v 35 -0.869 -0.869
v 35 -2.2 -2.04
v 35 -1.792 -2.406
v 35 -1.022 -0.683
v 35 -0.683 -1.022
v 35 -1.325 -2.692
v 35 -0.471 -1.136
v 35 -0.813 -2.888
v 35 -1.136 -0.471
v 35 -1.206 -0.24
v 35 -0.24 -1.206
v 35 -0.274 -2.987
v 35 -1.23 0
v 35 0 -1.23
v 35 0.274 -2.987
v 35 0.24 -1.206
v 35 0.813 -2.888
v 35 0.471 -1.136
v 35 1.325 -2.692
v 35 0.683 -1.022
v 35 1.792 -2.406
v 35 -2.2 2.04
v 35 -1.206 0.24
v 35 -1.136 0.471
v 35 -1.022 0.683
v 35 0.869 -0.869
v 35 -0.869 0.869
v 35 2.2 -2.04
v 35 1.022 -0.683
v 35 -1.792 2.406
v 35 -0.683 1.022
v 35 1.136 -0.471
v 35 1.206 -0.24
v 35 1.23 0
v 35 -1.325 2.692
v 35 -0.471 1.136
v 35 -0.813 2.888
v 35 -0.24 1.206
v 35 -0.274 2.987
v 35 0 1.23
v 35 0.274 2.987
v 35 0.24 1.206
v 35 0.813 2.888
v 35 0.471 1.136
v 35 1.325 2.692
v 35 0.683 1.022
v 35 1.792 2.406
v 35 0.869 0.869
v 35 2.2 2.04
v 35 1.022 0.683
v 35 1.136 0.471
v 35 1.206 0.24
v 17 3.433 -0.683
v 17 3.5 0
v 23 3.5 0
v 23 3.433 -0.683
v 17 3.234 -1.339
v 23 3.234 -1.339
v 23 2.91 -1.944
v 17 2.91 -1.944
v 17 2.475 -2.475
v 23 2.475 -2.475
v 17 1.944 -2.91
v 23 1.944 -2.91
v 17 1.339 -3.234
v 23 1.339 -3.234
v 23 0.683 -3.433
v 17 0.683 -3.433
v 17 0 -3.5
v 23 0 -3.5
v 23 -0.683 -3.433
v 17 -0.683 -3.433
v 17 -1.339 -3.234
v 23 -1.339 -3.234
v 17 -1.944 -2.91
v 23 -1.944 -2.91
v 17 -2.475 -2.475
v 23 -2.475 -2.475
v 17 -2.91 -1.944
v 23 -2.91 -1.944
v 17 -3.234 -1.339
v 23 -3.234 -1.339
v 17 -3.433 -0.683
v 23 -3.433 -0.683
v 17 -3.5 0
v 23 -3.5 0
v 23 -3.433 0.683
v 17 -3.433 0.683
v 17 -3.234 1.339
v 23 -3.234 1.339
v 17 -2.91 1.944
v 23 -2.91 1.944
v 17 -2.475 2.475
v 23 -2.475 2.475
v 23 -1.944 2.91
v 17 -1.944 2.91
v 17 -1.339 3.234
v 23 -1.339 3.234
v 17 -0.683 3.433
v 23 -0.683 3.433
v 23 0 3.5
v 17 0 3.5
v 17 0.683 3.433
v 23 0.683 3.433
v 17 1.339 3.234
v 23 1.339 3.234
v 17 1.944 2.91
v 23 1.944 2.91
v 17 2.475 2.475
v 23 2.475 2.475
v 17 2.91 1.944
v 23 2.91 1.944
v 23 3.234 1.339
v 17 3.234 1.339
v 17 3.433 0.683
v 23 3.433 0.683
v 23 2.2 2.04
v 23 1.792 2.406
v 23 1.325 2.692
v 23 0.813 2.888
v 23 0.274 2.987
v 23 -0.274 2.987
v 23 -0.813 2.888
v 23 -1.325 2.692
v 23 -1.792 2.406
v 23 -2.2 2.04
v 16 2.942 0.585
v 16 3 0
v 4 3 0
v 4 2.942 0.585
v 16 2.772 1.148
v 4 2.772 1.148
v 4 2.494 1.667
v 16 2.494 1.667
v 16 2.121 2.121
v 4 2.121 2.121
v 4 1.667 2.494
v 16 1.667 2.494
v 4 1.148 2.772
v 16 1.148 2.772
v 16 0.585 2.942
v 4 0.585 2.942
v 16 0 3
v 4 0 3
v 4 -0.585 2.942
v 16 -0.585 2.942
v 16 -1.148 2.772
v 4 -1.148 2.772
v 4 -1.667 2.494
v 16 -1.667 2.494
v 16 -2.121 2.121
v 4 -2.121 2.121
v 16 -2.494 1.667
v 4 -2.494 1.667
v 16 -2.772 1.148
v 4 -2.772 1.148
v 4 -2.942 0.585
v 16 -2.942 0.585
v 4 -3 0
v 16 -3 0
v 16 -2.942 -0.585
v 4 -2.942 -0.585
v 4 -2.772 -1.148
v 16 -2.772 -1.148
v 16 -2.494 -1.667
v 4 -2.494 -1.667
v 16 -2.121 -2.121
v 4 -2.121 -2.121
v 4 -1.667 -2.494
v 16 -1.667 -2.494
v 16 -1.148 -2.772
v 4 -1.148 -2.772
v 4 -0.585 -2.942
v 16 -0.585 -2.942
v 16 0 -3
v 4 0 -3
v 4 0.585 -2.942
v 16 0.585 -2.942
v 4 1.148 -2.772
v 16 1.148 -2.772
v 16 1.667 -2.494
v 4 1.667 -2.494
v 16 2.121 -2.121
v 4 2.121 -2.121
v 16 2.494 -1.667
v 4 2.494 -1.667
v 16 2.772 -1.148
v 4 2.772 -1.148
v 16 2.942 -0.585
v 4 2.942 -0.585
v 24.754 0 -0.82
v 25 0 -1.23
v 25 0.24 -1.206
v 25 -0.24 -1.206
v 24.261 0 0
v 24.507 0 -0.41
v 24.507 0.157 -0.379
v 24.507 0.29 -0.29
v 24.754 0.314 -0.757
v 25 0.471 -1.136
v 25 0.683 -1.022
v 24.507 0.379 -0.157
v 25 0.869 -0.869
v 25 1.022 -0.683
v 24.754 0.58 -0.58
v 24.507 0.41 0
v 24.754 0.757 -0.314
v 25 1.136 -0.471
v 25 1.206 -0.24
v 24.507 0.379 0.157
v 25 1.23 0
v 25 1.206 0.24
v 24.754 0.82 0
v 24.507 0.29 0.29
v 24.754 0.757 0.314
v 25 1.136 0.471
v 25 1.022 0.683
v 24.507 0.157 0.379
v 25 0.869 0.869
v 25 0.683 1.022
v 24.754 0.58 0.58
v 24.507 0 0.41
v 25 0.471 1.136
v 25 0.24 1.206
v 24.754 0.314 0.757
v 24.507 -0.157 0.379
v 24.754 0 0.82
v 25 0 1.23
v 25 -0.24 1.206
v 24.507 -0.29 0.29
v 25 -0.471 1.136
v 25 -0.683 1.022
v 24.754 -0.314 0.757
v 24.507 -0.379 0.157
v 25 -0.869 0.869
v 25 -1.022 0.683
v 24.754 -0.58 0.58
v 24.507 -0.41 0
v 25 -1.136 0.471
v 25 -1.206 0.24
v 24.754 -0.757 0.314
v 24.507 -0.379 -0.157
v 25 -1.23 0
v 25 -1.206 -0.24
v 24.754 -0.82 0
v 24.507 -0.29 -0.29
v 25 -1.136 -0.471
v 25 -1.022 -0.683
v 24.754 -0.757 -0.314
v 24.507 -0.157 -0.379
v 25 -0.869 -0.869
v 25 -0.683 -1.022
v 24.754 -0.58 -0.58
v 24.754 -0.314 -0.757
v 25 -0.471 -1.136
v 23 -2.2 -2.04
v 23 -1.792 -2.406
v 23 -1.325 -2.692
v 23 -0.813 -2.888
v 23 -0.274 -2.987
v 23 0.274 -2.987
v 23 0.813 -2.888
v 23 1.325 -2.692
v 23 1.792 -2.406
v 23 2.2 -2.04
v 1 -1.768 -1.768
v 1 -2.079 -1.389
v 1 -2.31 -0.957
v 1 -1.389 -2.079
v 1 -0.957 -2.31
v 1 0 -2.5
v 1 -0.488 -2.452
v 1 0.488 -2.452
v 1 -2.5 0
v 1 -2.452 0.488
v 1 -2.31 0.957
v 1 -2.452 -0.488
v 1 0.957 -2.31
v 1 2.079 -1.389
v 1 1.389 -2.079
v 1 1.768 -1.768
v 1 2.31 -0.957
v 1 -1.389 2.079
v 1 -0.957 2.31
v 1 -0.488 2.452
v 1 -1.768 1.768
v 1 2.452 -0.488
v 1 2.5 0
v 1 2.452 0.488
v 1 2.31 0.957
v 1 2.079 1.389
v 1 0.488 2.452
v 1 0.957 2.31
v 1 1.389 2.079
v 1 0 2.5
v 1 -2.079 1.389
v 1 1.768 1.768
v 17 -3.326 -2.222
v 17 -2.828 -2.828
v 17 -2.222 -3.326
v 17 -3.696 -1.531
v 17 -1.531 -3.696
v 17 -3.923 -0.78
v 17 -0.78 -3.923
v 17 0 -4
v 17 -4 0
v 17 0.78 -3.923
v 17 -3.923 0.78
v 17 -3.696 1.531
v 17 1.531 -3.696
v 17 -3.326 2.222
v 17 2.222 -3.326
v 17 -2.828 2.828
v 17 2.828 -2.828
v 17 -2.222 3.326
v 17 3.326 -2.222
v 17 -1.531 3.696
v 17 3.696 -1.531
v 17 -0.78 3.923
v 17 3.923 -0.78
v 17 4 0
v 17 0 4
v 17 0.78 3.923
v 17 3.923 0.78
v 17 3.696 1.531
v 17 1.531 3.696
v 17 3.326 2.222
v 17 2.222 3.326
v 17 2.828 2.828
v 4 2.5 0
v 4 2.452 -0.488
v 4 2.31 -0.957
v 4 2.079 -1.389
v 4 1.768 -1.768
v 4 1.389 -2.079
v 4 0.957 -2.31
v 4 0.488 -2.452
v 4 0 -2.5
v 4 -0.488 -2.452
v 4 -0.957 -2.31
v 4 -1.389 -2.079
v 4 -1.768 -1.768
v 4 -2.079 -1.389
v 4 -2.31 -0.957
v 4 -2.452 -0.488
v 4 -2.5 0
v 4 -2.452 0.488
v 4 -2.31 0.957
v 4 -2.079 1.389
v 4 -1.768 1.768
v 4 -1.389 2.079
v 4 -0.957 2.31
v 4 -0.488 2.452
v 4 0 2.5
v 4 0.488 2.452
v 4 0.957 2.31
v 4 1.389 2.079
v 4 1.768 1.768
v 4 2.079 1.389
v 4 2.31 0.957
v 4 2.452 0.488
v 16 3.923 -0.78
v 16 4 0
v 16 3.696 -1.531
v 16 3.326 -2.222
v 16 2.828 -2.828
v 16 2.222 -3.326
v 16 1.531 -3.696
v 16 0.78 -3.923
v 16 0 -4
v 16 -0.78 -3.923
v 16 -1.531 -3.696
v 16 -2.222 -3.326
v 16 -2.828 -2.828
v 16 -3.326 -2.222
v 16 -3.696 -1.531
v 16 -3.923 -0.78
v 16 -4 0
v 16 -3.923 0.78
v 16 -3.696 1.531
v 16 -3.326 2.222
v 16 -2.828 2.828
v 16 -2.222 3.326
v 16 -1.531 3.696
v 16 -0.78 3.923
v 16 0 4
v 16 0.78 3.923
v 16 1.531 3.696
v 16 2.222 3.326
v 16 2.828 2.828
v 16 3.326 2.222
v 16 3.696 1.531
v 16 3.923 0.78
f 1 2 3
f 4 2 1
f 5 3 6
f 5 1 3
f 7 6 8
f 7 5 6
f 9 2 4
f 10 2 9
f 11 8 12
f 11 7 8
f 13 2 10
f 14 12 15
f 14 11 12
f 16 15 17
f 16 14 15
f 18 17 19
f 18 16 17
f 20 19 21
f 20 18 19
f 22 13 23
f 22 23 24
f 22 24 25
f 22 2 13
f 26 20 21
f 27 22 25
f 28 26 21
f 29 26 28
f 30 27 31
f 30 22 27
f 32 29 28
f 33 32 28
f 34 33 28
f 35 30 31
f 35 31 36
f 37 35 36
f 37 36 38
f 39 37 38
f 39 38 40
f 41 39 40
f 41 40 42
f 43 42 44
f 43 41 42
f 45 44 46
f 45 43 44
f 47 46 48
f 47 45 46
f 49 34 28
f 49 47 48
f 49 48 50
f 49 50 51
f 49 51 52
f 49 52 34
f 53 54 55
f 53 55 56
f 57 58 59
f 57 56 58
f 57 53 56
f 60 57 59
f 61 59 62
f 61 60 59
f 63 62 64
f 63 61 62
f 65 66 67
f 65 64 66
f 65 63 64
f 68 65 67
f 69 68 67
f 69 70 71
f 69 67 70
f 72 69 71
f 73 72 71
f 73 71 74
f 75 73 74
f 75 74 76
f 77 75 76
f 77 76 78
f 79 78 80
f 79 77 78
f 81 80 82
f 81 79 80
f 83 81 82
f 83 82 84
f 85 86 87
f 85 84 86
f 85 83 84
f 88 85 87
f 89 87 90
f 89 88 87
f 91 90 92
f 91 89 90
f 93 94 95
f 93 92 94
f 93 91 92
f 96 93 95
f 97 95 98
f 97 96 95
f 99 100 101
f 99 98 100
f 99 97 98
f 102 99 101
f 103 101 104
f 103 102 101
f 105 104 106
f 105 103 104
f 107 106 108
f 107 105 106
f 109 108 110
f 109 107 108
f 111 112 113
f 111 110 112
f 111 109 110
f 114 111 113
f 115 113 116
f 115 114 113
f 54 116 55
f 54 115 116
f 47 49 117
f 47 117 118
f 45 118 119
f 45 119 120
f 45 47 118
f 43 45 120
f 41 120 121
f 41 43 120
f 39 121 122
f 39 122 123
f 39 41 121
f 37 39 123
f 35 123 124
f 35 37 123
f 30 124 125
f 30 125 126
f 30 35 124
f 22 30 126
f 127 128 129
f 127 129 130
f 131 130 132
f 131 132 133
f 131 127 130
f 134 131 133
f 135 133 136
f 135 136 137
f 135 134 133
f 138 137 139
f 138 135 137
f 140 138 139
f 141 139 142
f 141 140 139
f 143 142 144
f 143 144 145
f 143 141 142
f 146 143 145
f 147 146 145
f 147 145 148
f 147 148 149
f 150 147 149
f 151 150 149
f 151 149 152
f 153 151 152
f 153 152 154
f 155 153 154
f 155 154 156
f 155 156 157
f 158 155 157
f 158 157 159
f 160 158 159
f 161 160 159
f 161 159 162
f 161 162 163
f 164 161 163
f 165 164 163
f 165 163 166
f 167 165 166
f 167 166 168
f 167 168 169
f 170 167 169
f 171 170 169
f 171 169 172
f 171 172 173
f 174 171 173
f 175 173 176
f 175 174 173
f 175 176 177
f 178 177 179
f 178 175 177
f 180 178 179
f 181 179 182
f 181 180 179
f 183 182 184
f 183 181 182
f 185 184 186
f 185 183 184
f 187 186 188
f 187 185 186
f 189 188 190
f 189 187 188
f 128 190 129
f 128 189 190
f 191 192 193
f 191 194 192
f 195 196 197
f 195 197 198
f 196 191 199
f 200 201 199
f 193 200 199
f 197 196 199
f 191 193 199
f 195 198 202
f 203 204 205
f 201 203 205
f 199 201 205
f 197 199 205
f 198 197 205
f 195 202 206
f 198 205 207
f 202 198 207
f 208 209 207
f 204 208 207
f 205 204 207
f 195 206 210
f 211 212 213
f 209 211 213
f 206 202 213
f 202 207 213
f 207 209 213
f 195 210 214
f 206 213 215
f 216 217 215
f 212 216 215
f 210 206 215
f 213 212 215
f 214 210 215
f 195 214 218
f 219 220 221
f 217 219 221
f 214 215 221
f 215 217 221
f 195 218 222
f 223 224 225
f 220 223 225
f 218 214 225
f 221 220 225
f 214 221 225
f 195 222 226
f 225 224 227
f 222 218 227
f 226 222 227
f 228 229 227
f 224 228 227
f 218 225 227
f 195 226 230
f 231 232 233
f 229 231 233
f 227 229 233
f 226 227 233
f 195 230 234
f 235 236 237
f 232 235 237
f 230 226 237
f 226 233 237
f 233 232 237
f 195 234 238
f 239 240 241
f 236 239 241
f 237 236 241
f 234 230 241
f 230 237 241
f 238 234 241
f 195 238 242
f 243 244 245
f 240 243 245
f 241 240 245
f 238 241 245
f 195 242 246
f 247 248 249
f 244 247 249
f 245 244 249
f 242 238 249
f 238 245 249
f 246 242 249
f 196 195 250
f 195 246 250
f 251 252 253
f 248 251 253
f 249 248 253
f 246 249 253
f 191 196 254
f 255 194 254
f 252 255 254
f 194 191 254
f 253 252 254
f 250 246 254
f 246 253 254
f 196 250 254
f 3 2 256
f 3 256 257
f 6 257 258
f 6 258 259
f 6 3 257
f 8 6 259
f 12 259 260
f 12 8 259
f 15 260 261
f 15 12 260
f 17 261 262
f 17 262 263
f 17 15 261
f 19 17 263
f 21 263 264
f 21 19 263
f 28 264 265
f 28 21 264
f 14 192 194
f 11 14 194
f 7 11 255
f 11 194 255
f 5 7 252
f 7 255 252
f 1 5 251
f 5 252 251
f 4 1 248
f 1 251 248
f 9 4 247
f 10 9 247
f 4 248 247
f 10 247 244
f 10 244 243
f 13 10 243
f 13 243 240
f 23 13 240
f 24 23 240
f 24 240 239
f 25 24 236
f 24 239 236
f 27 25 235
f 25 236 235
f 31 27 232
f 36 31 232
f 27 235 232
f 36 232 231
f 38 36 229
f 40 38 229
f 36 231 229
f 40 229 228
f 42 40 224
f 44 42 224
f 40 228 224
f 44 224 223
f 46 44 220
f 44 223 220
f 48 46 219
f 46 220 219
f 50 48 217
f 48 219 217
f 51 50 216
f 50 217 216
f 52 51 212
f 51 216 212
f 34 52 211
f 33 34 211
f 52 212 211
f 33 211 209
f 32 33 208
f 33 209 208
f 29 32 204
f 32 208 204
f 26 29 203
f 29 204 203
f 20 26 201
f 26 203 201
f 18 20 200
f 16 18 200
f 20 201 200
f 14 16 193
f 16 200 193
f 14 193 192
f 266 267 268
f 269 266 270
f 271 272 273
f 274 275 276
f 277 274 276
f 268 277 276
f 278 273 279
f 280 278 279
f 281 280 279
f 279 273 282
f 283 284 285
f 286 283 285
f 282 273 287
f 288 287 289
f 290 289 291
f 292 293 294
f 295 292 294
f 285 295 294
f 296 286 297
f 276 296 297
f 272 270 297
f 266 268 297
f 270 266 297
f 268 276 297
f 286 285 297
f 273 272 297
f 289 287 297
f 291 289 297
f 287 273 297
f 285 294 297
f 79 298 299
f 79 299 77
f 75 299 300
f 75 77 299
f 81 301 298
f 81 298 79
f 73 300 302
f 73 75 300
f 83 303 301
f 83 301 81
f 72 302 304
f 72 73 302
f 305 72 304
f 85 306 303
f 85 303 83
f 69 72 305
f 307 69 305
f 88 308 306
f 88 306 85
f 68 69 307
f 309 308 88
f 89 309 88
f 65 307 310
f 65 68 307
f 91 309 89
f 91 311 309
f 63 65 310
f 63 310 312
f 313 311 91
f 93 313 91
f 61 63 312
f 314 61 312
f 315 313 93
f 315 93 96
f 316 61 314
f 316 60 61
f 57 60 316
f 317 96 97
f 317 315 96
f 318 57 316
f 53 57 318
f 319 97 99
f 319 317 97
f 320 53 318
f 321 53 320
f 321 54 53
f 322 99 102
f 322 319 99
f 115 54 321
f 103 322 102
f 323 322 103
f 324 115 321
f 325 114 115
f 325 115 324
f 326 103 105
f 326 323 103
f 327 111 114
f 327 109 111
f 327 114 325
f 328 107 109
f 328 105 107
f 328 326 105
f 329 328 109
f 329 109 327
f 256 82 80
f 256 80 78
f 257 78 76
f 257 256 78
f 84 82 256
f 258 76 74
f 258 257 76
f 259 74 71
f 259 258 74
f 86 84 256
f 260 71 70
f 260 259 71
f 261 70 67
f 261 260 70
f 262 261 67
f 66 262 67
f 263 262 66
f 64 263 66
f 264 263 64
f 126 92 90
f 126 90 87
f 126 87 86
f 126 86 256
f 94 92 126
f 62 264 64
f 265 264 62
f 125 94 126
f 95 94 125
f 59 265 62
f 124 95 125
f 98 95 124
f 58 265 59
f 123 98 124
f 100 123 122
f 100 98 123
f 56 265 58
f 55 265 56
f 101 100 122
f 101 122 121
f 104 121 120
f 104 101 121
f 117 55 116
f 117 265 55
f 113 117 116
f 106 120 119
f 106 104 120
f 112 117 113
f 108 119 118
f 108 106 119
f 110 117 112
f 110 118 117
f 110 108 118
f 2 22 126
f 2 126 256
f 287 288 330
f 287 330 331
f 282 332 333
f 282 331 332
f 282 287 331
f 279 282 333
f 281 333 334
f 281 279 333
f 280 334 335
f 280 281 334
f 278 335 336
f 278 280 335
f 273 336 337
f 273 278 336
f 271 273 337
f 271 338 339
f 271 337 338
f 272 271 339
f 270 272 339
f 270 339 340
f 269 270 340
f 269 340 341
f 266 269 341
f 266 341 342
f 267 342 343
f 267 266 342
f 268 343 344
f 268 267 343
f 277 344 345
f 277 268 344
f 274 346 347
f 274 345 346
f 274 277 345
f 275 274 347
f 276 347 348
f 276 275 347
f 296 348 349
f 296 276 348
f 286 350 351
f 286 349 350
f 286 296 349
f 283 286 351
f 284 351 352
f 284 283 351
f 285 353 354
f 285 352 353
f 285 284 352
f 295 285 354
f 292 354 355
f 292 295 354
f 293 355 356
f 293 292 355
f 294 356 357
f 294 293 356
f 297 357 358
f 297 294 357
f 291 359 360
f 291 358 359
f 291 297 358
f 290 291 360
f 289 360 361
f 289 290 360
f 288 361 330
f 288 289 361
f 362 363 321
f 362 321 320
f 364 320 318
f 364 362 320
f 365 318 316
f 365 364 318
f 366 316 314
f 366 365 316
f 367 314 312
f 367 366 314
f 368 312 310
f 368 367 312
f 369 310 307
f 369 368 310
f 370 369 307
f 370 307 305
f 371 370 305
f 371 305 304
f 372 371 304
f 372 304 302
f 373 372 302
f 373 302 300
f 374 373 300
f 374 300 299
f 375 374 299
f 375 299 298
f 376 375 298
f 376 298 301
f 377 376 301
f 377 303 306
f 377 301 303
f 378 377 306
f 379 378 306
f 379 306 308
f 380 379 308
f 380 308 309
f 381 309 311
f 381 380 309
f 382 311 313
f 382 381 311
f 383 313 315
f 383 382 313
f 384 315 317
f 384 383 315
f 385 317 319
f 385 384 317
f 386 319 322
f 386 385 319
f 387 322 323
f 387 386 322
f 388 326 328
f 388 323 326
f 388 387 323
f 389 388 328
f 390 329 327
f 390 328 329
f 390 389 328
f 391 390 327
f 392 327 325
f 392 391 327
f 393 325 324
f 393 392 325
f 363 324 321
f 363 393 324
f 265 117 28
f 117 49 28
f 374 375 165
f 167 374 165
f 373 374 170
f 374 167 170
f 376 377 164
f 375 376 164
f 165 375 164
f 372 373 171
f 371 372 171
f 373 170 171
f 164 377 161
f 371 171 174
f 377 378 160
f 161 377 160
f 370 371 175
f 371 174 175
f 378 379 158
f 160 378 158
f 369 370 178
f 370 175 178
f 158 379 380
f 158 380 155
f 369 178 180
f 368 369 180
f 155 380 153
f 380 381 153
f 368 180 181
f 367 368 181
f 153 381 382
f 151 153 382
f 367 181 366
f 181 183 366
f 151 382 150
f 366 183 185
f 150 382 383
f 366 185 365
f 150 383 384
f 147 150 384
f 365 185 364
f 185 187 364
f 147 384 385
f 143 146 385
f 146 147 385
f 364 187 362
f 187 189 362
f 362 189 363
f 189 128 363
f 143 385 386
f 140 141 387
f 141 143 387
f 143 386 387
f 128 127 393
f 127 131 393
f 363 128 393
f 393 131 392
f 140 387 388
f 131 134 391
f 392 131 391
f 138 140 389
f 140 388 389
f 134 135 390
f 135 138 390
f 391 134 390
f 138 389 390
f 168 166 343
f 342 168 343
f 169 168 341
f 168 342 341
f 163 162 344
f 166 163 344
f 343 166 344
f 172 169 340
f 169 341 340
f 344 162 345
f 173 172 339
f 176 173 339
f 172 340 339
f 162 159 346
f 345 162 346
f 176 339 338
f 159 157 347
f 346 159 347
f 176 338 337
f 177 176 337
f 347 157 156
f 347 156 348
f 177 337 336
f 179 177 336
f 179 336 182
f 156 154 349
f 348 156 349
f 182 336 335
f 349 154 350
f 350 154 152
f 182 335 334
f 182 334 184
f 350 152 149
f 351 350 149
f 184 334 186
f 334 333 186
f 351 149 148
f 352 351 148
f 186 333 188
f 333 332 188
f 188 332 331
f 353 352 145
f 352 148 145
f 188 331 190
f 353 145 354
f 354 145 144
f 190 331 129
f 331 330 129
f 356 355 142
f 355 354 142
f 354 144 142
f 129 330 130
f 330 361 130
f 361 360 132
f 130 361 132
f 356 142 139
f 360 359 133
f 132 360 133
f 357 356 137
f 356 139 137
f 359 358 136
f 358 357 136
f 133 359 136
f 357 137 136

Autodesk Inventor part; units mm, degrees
ref_plane "YZ Plane" through (0, 0, 0) normal (1, 0, 0) x (0, 1, 0)
ref_plane "XZ Plane" through (0, 0, 0) normal (0, 1, 0) x (-1, 0, 0)
ref_plane "XY Plane" through (0, 0, 0) normal (0, 0, 1) x (1, 0, 0)
sketch "Sketch1" plane through (0, 0, 0) normal (0, 0, 1) x (1, 0, 0)
  line L0 (4, 3) -> (6, 3)
  line L1 (6, 3) -> (6, 3)
  line L2 (16.5, 3.5) -> (16.5, 3.5)
  line L3 (35, 3) -> (35, 0)
  line L4 (4, 3) -> (4, 2.5)
  line L5 (4, 2.5) -> (1, 2.5)
  line L6 (1, 2.5) -> (1, 0)
  line L7 (1, 0) -> (35, 0)
  line L8 (23, 3) -> (35, 3)
  line L9 (23, 3.5) -> (17, 3.5)
  line L10 (23, 3.5) -> (23, 3)
  line L11 (17, 3.5) -> (17, 4)
  line L12 (17, 4) -> (16, 4)
  line L13 (16, 4) -> (16, 3)
  line L14 (6, 3) -> (16, 3)
  point P0 (0, 0)
  dimension "d1" = 2
  dimension "d25" = 3
  dimension "d26" = 2.5
  dimension "d40" = 12
  dimension "d41" = 3
  dimension "d42" = 0.5
  dimension "d44" = 6
  dimension "d45" = 1
  dimension "d46" = 10
  dimension "d47" = 3
  dimension "d48" = 3
revolve "Revolution2" add sketch "Sketch1" angle 360 about axis through (1, 0, 0) along (1, 0, 0)
sketch "Sketch3" plane through (35, 0, 0) normal (1, 0, 0) x (0, 0, -1)
  circle A0 centre (0, 0) radius 3 projected
  line L0 (-1.6583, 2.5) -> (1.6583, 2.5)
  line L1 (-1.6583, -2.5) -> (1.6583, -2.5)
  point P0 (0, 0)
  dimension "d21" = 0.5
  dimension "d31" = 0.5
extrude "Extrusion2" [suppressed]
sketch "Sketch4" plane through (4, 0, 0) normal (-1, 0, 0) x (0, 0, 1)
  line L0 (-1.6583, 2.5) -> (1.6583, 2.5)
  circle A0 centre (0, 0) radius 3 projected
  line L1 (-1.6583, -2.5) -> (1.6583, -2.5)
  point P0 (0, 0)
  dimension "d27" = 0.5
  dimension "d30" = 0.5
extrude "Extrusion3" [suppressed]
sketch "Sketch5" plane through (35, 0, 0) normal (1, 0, 0) x (0, 0, -1)
  point P0 (0, 0)
  point P1 (0, 0)
hole "Hole1" at (35, 0, 0) direction (-1, 0, 0) diameter 2.459 depth 10 tip angle 118 thread size "M3x0.5" class "6H" standard "ISO Metric profile"
sketch "Sketch6" plane through (35, 0, 0) normal (1, 0, 0) x (0, 0, -1)
  circle A0 centre (0, 0) radius 1.2295 projected
  circle A1 centre (0, 0) radius 3 projected
  circle A2 centre (0, 0) radius 3 projected
  line L0 (-2.0396, 2.2) -> (2.0396, 2.2)
  line L1 (-2.0396, -2.2) -> (2.0396, -2.2)
  dimension "d56" = 2.2
  dimension "d57" = 2.2
extrude "Extrusion4" cut sketch "Sketch6" against normal up to surface (12 mm away) contours L0 A1 | A1 L1
equation "\"d57\" = d56"
properties part number "Wał koła" material "Aluminum 6061, Welded"
